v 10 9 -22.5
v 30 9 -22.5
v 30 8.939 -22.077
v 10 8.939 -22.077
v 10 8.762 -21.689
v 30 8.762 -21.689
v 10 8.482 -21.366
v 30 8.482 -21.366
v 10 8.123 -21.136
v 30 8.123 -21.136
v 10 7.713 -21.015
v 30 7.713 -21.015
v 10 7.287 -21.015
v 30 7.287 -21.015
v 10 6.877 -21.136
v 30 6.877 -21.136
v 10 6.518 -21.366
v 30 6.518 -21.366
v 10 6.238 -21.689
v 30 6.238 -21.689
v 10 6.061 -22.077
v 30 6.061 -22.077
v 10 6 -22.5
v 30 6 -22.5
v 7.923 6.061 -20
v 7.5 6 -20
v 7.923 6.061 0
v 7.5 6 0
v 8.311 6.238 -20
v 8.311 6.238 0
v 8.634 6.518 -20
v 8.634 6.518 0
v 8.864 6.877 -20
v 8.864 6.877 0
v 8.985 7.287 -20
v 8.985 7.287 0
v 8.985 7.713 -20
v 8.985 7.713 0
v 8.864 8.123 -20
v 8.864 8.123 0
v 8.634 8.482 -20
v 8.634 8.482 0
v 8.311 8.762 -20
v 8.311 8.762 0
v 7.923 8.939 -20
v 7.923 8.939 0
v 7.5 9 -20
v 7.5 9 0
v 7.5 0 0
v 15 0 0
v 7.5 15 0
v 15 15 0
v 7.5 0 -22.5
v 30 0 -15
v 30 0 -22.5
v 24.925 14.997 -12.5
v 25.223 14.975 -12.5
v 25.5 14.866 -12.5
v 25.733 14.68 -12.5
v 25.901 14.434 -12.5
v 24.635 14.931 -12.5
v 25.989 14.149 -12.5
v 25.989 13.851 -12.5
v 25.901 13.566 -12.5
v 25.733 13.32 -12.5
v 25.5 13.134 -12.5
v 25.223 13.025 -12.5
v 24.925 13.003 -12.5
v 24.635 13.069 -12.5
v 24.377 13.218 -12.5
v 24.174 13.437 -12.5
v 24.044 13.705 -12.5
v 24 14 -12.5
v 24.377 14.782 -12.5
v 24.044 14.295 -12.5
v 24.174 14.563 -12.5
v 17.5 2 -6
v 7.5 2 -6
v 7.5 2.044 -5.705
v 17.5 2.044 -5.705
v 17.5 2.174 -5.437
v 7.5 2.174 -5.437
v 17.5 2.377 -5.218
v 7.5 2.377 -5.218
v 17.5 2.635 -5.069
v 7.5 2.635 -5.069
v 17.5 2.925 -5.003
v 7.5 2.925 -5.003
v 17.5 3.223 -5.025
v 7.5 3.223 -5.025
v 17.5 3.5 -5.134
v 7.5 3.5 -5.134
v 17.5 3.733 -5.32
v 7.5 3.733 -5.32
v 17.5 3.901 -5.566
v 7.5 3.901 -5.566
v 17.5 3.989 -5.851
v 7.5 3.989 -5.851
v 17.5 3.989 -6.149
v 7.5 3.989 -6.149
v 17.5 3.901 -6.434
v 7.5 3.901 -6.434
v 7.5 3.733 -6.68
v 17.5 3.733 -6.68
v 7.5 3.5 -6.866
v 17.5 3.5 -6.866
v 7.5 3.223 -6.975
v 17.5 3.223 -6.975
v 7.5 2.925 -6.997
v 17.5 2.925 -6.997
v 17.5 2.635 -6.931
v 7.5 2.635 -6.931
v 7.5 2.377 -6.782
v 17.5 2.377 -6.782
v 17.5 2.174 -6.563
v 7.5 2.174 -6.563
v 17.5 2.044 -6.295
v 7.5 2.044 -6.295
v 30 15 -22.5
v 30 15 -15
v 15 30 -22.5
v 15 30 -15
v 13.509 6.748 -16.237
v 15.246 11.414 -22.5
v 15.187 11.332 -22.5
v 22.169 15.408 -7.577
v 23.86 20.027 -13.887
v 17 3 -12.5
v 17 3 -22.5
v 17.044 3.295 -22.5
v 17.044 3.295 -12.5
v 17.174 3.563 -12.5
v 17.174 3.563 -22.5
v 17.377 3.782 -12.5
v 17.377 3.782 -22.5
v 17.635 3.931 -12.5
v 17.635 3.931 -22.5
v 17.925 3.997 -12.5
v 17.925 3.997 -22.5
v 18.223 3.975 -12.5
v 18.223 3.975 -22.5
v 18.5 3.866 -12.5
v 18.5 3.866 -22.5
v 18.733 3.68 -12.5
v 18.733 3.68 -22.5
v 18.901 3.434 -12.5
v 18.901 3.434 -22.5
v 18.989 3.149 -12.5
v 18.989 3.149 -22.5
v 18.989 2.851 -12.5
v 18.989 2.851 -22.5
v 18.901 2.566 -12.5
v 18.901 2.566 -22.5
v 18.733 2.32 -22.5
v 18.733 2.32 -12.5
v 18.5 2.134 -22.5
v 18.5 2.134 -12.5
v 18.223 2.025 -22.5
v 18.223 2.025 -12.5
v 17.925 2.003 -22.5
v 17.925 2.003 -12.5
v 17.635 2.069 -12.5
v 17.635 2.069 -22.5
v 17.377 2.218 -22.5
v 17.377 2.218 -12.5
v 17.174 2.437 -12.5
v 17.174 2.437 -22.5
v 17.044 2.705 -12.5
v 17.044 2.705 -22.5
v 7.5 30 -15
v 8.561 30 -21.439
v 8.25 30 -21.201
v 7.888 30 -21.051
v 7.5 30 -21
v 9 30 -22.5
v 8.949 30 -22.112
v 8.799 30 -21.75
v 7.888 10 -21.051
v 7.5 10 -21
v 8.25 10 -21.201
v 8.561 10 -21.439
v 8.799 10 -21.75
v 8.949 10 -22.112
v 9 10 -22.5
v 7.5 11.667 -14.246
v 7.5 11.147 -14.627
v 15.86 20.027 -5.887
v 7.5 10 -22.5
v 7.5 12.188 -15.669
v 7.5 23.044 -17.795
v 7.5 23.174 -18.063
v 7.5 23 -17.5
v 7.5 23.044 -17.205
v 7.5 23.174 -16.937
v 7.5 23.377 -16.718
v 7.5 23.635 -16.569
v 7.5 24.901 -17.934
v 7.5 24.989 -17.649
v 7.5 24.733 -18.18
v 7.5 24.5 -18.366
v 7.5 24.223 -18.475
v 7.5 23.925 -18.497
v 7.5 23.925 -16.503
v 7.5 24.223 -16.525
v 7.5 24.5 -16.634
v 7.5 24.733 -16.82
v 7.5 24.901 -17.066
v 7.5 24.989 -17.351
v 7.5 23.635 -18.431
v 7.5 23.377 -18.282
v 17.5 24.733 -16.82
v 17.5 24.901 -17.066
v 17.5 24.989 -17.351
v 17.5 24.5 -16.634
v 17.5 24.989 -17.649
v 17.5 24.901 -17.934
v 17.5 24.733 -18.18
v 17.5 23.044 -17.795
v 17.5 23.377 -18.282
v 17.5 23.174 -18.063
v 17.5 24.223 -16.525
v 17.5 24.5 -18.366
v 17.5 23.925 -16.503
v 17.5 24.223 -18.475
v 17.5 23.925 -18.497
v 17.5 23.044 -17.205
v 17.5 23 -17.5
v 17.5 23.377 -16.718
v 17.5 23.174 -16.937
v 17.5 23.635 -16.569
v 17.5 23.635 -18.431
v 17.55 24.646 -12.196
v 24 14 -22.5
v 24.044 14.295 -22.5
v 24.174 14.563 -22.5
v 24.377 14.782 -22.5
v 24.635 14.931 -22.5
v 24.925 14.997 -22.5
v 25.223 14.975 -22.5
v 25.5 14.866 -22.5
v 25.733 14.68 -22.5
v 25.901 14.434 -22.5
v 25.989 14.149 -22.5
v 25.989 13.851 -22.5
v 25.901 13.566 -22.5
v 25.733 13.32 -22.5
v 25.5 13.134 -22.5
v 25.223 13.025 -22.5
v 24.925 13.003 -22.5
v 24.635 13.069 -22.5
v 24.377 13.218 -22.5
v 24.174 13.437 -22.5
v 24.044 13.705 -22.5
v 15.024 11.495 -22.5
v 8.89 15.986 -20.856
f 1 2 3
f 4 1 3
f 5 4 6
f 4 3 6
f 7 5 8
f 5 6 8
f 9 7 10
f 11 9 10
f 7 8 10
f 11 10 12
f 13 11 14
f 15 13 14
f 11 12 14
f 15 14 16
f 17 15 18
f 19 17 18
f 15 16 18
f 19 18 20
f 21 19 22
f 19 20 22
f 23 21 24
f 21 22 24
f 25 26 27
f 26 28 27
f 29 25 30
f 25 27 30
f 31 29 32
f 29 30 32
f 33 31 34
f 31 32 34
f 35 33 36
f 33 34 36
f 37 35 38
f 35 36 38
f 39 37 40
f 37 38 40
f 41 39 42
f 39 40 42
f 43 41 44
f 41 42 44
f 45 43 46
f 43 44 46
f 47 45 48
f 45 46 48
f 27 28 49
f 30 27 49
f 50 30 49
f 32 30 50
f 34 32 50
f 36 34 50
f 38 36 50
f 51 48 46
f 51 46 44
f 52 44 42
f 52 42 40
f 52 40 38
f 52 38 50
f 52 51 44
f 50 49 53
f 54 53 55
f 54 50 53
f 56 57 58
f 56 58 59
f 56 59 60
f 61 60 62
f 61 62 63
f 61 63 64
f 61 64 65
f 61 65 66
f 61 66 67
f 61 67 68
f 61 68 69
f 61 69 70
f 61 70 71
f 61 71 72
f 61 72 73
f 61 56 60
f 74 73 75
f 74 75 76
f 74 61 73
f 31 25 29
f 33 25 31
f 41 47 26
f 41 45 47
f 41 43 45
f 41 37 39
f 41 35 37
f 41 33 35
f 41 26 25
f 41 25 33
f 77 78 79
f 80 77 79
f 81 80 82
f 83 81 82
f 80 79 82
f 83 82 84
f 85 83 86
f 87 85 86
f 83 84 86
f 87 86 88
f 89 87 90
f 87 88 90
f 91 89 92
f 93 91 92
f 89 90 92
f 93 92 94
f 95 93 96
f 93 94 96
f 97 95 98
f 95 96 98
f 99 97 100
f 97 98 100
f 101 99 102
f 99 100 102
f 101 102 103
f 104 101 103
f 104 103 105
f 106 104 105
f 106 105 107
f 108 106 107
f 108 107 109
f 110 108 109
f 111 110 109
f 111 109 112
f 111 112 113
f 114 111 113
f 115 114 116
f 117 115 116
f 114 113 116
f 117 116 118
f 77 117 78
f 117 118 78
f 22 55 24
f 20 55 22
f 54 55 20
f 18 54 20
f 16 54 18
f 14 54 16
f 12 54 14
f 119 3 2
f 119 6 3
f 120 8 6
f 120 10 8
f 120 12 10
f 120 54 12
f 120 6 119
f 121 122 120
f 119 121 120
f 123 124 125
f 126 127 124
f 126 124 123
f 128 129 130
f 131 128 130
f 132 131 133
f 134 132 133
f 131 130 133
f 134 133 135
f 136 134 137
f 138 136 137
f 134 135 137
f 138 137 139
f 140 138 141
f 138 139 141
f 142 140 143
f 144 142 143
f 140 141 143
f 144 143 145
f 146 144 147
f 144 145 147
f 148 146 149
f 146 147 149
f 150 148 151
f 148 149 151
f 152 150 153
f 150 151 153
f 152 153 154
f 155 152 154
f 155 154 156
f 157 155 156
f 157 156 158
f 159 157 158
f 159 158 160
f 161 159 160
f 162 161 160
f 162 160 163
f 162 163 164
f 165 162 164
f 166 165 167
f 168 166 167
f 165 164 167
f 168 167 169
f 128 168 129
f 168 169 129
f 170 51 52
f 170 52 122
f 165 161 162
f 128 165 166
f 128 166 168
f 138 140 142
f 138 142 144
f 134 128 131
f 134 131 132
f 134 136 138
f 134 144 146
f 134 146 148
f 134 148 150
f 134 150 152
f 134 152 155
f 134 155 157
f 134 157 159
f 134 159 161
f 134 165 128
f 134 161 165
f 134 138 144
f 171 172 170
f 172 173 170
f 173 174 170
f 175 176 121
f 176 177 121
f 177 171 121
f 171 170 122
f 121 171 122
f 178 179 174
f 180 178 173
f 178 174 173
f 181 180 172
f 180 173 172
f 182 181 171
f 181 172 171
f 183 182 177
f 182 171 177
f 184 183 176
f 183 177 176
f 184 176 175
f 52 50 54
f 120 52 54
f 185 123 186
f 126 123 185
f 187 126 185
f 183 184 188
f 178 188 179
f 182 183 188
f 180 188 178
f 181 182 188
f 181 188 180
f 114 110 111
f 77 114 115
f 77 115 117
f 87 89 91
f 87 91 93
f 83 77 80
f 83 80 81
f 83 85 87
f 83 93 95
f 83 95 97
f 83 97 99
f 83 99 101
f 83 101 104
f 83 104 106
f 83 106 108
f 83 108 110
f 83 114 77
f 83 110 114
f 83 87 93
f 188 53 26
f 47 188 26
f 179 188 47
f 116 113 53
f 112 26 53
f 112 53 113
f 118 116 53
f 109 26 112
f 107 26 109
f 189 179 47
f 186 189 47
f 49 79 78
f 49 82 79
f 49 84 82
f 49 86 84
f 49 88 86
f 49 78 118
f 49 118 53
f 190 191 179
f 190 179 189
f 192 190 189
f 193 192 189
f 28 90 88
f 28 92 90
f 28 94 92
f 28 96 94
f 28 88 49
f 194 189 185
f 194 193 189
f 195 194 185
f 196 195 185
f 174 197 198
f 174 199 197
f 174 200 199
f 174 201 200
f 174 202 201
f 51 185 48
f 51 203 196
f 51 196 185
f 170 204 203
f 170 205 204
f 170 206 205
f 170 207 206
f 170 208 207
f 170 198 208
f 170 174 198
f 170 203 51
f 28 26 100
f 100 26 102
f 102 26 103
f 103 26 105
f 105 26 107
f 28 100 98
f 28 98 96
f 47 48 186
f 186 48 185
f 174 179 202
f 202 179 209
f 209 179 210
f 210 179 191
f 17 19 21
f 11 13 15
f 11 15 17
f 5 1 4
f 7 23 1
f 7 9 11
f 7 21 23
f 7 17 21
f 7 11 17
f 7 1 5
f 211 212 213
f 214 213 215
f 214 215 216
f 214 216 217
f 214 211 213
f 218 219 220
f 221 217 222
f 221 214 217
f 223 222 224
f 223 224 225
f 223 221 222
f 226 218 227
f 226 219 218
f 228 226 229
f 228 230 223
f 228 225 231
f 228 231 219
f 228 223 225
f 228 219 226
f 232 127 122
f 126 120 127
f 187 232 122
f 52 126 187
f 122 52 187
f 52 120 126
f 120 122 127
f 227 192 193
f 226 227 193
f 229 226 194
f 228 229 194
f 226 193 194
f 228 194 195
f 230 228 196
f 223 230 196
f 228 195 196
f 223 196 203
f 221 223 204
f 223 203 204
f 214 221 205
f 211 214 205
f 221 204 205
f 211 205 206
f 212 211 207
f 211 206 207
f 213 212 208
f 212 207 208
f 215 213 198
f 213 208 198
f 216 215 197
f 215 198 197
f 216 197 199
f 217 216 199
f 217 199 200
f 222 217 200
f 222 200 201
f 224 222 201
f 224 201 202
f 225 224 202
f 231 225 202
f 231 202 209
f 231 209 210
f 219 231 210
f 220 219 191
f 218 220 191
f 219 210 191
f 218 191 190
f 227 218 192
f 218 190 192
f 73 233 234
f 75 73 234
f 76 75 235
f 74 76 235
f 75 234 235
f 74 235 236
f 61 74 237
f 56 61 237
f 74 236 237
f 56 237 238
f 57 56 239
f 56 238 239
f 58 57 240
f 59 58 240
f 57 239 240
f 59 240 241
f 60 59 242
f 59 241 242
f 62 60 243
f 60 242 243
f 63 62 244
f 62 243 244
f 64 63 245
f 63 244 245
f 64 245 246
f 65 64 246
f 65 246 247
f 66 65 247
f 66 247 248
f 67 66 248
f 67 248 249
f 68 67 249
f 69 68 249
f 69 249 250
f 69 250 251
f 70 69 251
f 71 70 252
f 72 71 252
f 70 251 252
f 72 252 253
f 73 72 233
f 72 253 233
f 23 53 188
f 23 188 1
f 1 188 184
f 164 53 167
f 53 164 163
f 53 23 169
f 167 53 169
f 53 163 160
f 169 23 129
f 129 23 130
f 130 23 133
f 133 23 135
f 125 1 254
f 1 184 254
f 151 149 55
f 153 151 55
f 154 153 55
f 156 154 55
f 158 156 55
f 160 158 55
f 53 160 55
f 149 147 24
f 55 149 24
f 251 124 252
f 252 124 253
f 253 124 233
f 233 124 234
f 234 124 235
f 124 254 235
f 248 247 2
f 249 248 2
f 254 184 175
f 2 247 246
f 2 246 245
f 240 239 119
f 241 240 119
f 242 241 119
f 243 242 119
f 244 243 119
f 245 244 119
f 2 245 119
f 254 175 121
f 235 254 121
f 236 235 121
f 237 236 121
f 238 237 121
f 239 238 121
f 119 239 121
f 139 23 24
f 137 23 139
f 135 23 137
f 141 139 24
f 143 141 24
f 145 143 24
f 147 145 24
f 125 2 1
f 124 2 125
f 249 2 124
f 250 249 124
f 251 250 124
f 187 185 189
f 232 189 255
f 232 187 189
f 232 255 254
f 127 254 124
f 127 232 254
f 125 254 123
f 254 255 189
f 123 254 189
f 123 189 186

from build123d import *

# Parameters (mm, degrees)
SKETCH1_W           = 30
SKETCH1_H           = 30
BOSS_EXTRUDE1_DEPTH = 30
CUT_EXTRUDE1_DEPTH  = 30
CUT_EXTRUDE2_DEPTH  = 30
CUT_EXTRUDE3_DEPTH  = 30
CUT_EXTRUDE4_DEPTH  = 30
CUT_EXTRUDE5_DEPTH  = 15
SKETCH6_R           = 1.5
CUT_EXTRUDE6_DEPTH  = 20
SKETCH8_R           = 1.5
CUT_EXTRUDE8_DEPTH  = 20
SKETCH10_R          = 1.5
CUT_EXTRUDE10_DEPTH = 20
CUT_EXTRUDE12_DEPTH = 52.961524227
SKETCH16_W          = 28.664479863
SKETCH16_H          = 34.476014612
CUT_EXTRUDE13_DEPTH = 7.5
SKETCH18_R          = 1
CUT_EXTRUDE14_DEPTH = 10
SKETCH19_R          = 1
CUT_EXTRUDE15_DEPTH = 10


with BuildPart() as part:
    # Sketch1 → Boss-Extrude1 (new body)
    with BuildSketch(Plane.XY):
        with Locations((15, 15)):
            Rectangle(SKETCH1_W, SKETCH1_H)
    extrude(amount=-BOSS_EXTRUDE1_DEPTH)

    # Sketch2 → Cut-Extrude1 (cut)
    with BuildSketch(Plane.XY):
        Polygon((15, 30), (30, 15), (45, 15), (45, 45.619084343), (15, 40.368332998), align=None)
    extrude(amount=-CUT_EXTRUDE1_DEPTH, mode=Mode.SUBTRACT)

    # Sketch3 → Cut-Extrude2 (cut)
    with BuildSketch(Plane.ZY):
        Polygon((0, 15), (-15, 30), (-15, 36.177250049), (9.539630377, 36.177250049), (9.539630377, 15), align=None)
    extrude(amount=-CUT_EXTRUDE2_DEPTH, mode=Mode.SUBTRACT)

    # Sketch4 → Cut-Extrude3 (cut)
    with BuildSketch(Plane.XZ):
        Polygon((15, 0), (30, -15), (40.227840819, -15), (40.227840819, 9.317096887), (15, 8.966367386), align=None)
    extrude(amount=-CUT_EXTRUDE3_DEPTH, mode=Mode.SUBTRACT)

    # 3DSketch1 → Cut-Extrude4 (cut)
    with BuildSketch(Plane(origin=(33.996909354, 3.570047518, -7.566956872), x_dir=(-0.34464530014522, 0.4926249601560642, 0.7990871452595439), z_dir=(-0.2113248654051872, 0.788675134594813, -0.5773502691896257))):
        Polygon((0, 0), (25.47550653, -16.637081723), (36.340550094, 0), (10.865043564, 16.637081723), align=None)
    extrude(amount=CUT_EXTRUDE4_DEPTH, mode=Mode.SUBTRACT)

    # Sketch5 → Cut-Extrude5 (cut)
    with BuildSketch(Plane(origin=(10, 10, 10), x_dir=(0.4082482904638628, 0.40824829046386263, -0.8164965809277264), z_dir=(0.5773502691896263, 0.5773502691896258, 0.5773502691896254))):
        Polygon((19.457058725, 2.946852636), (27.184465336, 5.017404997), (29.255017696, -2.710001614), (21.527611086, -4.780553975), align=None)
    extrude(amount=-CUT_EXTRUDE5_DEPTH, mode=Mode.SUBTRACT)

    # Sketch6 → Cut-Extrude6 (cut)
    with BuildSketch(Plane(origin=(0, 30, 0), x_dir=(1, 0, 0), z_dir=(0, 1, 0))):
        with Locations(Location((7.5, 22.5, 0), (0, 0, 270))):
            Circle(SKETCH6_R)
    extrude(amount=-CUT_EXTRUDE6_DEPTH, mode=Mode.SUBTRACT)

    # Sketch8 → Cut-Extrude8 (cut)
    with BuildSketch(Plane.XY):
        with Locations((7.5, 7.5)):
            Circle(SKETCH8_R)
    extrude(amount=-CUT_EXTRUDE8_DEPTH, mode=Mode.SUBTRACT)

    # Sketch10 → Cut-Extrude10 (cut)
    with BuildSketch(Plane(origin=(30, 0, 0), x_dir=(0, 0, -1), z_dir=(1, 0, 0))):
        with Locations(Location((22.5, 7.5, 0), (0, 0, 90))):
            Circle(SKETCH10_R)
    extrude(amount=-CUT_EXTRUDE10_DEPTH, mode=Mode.SUBTRACT)

    # Sketch14 → Cut-Extrude12 (cut, through all)
    with BuildSketch(Plane(origin=(0, 30, 0), x_dir=(1, 0, 0), z_dir=(0, 1, 0))):
        Polygon((0, 31.6), (32.521135015, 31.6), (32.521135015, 22.5), (6, 22.5), (0, 22.5), align=None)
    extrude(amount=-CUT_EXTRUDE12_DEPTH, mode=Mode.SUBTRACT)

    # Sketch16 → Cut-Extrude13 (cut)
    with BuildSketch(Plane.ZY):
        with Locations((-14.332239932, 17.238007306)):
            Rectangle(SKETCH16_W, SKETCH16_H)
    extrude(amount=-CUT_EXTRUDE13_DEPTH, mode=Mode.SUBTRACT)

    # Sketch18 → Cut-Extrude14 (cut)
    with BuildSketch(Plane.ZY.offset(-7.5)):
        with Locations(Location((-17.5, 24, 0), (0, 0, 270))):
            Circle(SKETCH18_R)
        with Locations(Location((-6, 3, 0), (0, 0, 270))):
            Circle(SKETCH18_R)
    extrude(amount=-CUT_EXTRUDE14_DEPTH, mode=Mode.SUBTRACT)

    # Sketch19 → Cut-Extrude15 (cut)
    with BuildSketch(Plane(origin=(0, 0, -22.5), x_dir=(-1, 0, 0), z_dir=(0, 0, -1))):
        with Locations((-25, 14)):
            Circle(SKETCH19_R)
        with Locations((-18, 3)):
            Circle(SKETCH19_R)
    extrude(amount=-CUT_EXTRUDE15_DEPTH, mode=Mode.SUBTRACT)


solid = part.part
